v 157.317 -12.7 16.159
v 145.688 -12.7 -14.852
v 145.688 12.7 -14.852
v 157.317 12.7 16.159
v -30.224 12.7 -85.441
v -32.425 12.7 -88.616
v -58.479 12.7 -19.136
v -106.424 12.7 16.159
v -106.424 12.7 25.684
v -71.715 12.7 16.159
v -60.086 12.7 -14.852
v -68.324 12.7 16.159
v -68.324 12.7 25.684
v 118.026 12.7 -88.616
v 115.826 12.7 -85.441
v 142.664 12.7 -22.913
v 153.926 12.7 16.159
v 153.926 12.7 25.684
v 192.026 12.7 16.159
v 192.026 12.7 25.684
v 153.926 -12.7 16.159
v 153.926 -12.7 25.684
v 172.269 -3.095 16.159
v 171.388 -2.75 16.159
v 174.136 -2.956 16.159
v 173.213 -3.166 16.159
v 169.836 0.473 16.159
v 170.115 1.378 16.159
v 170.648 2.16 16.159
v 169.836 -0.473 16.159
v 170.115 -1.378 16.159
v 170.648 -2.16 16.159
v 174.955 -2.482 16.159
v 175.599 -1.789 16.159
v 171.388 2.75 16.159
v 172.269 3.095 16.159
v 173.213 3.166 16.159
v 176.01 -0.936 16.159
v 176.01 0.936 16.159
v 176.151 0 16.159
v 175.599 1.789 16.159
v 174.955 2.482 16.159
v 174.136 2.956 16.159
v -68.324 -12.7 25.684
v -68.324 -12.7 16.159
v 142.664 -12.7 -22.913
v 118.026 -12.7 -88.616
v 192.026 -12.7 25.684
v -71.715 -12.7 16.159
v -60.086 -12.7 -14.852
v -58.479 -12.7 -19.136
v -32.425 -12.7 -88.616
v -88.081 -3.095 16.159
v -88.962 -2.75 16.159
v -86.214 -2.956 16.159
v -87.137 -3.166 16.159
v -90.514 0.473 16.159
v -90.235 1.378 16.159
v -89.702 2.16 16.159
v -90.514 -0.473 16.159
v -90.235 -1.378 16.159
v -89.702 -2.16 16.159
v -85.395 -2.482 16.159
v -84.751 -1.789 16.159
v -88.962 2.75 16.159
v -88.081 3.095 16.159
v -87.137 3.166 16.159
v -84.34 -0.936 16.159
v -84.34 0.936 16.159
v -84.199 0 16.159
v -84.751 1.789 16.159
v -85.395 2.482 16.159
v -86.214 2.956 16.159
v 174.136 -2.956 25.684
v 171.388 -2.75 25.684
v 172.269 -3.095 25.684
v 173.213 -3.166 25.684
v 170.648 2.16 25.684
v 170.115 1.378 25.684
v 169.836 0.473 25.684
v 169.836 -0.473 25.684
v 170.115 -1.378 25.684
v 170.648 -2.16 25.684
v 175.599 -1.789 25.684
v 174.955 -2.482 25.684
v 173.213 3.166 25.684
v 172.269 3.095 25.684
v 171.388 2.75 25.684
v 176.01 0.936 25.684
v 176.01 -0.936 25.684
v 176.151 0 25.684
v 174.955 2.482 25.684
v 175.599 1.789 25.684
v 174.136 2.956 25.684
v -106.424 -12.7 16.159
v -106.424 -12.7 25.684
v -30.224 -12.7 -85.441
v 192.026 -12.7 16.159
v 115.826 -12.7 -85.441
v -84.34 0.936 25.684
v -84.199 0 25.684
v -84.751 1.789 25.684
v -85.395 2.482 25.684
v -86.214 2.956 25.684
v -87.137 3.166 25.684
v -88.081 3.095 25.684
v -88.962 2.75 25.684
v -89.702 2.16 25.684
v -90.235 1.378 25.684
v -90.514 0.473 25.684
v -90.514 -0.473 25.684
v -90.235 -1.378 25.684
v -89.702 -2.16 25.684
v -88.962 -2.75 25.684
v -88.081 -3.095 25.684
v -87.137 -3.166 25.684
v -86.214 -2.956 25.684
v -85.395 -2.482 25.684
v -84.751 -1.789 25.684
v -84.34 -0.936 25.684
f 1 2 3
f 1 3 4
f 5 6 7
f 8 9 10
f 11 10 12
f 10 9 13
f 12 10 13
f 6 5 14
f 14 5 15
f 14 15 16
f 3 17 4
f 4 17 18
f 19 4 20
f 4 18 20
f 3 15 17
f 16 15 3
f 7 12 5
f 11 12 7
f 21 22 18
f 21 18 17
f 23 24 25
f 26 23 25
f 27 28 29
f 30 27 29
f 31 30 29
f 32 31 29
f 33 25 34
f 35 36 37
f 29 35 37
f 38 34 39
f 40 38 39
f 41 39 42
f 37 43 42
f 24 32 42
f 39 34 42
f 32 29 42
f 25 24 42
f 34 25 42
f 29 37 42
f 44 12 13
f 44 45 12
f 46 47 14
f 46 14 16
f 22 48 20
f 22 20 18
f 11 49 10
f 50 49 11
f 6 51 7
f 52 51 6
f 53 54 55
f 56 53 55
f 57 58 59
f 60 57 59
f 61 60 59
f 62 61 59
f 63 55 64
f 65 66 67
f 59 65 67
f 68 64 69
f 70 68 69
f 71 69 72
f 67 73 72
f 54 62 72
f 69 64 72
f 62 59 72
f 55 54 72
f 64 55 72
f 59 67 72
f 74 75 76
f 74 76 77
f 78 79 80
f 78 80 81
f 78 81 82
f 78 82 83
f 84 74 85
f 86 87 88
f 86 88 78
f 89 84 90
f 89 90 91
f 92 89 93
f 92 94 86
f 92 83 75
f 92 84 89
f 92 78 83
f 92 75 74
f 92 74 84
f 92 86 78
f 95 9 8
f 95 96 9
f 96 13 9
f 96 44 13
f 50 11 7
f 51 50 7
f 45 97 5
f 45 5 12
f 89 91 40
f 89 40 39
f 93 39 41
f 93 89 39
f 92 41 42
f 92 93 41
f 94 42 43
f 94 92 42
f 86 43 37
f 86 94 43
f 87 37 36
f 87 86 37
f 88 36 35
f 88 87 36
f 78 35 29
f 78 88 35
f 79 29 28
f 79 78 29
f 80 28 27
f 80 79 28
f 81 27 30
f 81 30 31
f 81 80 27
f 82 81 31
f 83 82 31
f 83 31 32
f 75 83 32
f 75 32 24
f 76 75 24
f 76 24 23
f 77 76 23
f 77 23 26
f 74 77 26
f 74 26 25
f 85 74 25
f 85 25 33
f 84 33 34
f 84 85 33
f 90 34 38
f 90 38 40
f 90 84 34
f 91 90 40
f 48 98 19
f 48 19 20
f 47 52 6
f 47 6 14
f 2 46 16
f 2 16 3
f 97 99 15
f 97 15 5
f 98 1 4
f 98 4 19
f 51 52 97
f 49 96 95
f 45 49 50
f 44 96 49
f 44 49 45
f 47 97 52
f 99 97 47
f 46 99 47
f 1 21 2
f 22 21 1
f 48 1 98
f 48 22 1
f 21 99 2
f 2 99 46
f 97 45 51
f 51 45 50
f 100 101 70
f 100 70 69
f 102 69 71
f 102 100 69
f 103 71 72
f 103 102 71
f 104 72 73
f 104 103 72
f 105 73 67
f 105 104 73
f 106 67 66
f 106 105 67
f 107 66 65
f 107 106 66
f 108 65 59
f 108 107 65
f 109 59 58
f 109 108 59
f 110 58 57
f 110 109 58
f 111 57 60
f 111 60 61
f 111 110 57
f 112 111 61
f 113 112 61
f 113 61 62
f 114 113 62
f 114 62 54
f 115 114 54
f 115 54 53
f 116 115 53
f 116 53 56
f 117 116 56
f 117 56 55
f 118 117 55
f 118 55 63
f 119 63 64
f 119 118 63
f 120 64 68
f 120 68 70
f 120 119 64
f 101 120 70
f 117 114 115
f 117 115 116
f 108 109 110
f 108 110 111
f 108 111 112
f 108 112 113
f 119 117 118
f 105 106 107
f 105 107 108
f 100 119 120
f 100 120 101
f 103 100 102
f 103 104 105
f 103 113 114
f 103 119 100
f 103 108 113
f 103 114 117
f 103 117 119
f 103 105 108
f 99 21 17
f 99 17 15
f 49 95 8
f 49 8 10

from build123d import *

# Parameters (mm, degrees)
F1_DEPTH = 12.7
F2_R     = 3.175
F3_DEPTH = 9.525
F4_R     = 3.175
F5_DEPTH = 9.525


with BuildPart() as f1:
    # F0 (on Front) → F1 (new body, symmetric)
    with BuildSketch(Plane.XZ):
        Polygon((-75.287023, 25.684148), (-106.424246, 25.684148), (-106.424246, 16.159148), (-71.715148, 16.159148), align=None)
        Polygon((-68.324246, 25.684148), (-75.287023, 25.684148), (-71.715148, 16.159148), (-68.324246, 16.159148), align=None)
        Polygon((-68.324246, 16.159148), (-71.715148, 16.159148), (-60.086074, -14.851716), (-58.47931, -19.136419), (-32.424523, -88.615852), (118.02603, -88.615852), (142.664416, -22.91349), (145.687581, -14.851716), (157.316655, 16.159148), (153.925754, 16.159148), (115.825754, -85.440852), (-30.224246, -85.440852), align=None)
        Polygon((153.925754, 25.684148), (153.925754, 16.159148), (157.316655, 16.159148), (160.88853, 25.684148), align=None)
        Polygon((160.88853, 25.684148), (157.316655, 16.159148), (192.025754, 16.159148), (192.025754, 25.684148), align=None)
    extrude(amount=F1_DEPTH, both=True)


with BuildPart() as f3:
    # F2 (on face) → F3 (new body)
    with BuildSketch(Plane.XY.offset(25.684148)):
        with Locations((-87.374246, 0)):
            Circle(F2_R)
    extrude(amount=-F3_DEPTH)


with BuildPart() as f5:
    # F4 (on face) → F5 (new body)
    with BuildSketch(Plane.XY.offset(25.684148)):
        with Locations((172.975754, 0)):
            Circle(F4_R)
    extrude(amount=-F5_DEPTH)


solid = Compound([f1.part, f3.part, f5.part])
